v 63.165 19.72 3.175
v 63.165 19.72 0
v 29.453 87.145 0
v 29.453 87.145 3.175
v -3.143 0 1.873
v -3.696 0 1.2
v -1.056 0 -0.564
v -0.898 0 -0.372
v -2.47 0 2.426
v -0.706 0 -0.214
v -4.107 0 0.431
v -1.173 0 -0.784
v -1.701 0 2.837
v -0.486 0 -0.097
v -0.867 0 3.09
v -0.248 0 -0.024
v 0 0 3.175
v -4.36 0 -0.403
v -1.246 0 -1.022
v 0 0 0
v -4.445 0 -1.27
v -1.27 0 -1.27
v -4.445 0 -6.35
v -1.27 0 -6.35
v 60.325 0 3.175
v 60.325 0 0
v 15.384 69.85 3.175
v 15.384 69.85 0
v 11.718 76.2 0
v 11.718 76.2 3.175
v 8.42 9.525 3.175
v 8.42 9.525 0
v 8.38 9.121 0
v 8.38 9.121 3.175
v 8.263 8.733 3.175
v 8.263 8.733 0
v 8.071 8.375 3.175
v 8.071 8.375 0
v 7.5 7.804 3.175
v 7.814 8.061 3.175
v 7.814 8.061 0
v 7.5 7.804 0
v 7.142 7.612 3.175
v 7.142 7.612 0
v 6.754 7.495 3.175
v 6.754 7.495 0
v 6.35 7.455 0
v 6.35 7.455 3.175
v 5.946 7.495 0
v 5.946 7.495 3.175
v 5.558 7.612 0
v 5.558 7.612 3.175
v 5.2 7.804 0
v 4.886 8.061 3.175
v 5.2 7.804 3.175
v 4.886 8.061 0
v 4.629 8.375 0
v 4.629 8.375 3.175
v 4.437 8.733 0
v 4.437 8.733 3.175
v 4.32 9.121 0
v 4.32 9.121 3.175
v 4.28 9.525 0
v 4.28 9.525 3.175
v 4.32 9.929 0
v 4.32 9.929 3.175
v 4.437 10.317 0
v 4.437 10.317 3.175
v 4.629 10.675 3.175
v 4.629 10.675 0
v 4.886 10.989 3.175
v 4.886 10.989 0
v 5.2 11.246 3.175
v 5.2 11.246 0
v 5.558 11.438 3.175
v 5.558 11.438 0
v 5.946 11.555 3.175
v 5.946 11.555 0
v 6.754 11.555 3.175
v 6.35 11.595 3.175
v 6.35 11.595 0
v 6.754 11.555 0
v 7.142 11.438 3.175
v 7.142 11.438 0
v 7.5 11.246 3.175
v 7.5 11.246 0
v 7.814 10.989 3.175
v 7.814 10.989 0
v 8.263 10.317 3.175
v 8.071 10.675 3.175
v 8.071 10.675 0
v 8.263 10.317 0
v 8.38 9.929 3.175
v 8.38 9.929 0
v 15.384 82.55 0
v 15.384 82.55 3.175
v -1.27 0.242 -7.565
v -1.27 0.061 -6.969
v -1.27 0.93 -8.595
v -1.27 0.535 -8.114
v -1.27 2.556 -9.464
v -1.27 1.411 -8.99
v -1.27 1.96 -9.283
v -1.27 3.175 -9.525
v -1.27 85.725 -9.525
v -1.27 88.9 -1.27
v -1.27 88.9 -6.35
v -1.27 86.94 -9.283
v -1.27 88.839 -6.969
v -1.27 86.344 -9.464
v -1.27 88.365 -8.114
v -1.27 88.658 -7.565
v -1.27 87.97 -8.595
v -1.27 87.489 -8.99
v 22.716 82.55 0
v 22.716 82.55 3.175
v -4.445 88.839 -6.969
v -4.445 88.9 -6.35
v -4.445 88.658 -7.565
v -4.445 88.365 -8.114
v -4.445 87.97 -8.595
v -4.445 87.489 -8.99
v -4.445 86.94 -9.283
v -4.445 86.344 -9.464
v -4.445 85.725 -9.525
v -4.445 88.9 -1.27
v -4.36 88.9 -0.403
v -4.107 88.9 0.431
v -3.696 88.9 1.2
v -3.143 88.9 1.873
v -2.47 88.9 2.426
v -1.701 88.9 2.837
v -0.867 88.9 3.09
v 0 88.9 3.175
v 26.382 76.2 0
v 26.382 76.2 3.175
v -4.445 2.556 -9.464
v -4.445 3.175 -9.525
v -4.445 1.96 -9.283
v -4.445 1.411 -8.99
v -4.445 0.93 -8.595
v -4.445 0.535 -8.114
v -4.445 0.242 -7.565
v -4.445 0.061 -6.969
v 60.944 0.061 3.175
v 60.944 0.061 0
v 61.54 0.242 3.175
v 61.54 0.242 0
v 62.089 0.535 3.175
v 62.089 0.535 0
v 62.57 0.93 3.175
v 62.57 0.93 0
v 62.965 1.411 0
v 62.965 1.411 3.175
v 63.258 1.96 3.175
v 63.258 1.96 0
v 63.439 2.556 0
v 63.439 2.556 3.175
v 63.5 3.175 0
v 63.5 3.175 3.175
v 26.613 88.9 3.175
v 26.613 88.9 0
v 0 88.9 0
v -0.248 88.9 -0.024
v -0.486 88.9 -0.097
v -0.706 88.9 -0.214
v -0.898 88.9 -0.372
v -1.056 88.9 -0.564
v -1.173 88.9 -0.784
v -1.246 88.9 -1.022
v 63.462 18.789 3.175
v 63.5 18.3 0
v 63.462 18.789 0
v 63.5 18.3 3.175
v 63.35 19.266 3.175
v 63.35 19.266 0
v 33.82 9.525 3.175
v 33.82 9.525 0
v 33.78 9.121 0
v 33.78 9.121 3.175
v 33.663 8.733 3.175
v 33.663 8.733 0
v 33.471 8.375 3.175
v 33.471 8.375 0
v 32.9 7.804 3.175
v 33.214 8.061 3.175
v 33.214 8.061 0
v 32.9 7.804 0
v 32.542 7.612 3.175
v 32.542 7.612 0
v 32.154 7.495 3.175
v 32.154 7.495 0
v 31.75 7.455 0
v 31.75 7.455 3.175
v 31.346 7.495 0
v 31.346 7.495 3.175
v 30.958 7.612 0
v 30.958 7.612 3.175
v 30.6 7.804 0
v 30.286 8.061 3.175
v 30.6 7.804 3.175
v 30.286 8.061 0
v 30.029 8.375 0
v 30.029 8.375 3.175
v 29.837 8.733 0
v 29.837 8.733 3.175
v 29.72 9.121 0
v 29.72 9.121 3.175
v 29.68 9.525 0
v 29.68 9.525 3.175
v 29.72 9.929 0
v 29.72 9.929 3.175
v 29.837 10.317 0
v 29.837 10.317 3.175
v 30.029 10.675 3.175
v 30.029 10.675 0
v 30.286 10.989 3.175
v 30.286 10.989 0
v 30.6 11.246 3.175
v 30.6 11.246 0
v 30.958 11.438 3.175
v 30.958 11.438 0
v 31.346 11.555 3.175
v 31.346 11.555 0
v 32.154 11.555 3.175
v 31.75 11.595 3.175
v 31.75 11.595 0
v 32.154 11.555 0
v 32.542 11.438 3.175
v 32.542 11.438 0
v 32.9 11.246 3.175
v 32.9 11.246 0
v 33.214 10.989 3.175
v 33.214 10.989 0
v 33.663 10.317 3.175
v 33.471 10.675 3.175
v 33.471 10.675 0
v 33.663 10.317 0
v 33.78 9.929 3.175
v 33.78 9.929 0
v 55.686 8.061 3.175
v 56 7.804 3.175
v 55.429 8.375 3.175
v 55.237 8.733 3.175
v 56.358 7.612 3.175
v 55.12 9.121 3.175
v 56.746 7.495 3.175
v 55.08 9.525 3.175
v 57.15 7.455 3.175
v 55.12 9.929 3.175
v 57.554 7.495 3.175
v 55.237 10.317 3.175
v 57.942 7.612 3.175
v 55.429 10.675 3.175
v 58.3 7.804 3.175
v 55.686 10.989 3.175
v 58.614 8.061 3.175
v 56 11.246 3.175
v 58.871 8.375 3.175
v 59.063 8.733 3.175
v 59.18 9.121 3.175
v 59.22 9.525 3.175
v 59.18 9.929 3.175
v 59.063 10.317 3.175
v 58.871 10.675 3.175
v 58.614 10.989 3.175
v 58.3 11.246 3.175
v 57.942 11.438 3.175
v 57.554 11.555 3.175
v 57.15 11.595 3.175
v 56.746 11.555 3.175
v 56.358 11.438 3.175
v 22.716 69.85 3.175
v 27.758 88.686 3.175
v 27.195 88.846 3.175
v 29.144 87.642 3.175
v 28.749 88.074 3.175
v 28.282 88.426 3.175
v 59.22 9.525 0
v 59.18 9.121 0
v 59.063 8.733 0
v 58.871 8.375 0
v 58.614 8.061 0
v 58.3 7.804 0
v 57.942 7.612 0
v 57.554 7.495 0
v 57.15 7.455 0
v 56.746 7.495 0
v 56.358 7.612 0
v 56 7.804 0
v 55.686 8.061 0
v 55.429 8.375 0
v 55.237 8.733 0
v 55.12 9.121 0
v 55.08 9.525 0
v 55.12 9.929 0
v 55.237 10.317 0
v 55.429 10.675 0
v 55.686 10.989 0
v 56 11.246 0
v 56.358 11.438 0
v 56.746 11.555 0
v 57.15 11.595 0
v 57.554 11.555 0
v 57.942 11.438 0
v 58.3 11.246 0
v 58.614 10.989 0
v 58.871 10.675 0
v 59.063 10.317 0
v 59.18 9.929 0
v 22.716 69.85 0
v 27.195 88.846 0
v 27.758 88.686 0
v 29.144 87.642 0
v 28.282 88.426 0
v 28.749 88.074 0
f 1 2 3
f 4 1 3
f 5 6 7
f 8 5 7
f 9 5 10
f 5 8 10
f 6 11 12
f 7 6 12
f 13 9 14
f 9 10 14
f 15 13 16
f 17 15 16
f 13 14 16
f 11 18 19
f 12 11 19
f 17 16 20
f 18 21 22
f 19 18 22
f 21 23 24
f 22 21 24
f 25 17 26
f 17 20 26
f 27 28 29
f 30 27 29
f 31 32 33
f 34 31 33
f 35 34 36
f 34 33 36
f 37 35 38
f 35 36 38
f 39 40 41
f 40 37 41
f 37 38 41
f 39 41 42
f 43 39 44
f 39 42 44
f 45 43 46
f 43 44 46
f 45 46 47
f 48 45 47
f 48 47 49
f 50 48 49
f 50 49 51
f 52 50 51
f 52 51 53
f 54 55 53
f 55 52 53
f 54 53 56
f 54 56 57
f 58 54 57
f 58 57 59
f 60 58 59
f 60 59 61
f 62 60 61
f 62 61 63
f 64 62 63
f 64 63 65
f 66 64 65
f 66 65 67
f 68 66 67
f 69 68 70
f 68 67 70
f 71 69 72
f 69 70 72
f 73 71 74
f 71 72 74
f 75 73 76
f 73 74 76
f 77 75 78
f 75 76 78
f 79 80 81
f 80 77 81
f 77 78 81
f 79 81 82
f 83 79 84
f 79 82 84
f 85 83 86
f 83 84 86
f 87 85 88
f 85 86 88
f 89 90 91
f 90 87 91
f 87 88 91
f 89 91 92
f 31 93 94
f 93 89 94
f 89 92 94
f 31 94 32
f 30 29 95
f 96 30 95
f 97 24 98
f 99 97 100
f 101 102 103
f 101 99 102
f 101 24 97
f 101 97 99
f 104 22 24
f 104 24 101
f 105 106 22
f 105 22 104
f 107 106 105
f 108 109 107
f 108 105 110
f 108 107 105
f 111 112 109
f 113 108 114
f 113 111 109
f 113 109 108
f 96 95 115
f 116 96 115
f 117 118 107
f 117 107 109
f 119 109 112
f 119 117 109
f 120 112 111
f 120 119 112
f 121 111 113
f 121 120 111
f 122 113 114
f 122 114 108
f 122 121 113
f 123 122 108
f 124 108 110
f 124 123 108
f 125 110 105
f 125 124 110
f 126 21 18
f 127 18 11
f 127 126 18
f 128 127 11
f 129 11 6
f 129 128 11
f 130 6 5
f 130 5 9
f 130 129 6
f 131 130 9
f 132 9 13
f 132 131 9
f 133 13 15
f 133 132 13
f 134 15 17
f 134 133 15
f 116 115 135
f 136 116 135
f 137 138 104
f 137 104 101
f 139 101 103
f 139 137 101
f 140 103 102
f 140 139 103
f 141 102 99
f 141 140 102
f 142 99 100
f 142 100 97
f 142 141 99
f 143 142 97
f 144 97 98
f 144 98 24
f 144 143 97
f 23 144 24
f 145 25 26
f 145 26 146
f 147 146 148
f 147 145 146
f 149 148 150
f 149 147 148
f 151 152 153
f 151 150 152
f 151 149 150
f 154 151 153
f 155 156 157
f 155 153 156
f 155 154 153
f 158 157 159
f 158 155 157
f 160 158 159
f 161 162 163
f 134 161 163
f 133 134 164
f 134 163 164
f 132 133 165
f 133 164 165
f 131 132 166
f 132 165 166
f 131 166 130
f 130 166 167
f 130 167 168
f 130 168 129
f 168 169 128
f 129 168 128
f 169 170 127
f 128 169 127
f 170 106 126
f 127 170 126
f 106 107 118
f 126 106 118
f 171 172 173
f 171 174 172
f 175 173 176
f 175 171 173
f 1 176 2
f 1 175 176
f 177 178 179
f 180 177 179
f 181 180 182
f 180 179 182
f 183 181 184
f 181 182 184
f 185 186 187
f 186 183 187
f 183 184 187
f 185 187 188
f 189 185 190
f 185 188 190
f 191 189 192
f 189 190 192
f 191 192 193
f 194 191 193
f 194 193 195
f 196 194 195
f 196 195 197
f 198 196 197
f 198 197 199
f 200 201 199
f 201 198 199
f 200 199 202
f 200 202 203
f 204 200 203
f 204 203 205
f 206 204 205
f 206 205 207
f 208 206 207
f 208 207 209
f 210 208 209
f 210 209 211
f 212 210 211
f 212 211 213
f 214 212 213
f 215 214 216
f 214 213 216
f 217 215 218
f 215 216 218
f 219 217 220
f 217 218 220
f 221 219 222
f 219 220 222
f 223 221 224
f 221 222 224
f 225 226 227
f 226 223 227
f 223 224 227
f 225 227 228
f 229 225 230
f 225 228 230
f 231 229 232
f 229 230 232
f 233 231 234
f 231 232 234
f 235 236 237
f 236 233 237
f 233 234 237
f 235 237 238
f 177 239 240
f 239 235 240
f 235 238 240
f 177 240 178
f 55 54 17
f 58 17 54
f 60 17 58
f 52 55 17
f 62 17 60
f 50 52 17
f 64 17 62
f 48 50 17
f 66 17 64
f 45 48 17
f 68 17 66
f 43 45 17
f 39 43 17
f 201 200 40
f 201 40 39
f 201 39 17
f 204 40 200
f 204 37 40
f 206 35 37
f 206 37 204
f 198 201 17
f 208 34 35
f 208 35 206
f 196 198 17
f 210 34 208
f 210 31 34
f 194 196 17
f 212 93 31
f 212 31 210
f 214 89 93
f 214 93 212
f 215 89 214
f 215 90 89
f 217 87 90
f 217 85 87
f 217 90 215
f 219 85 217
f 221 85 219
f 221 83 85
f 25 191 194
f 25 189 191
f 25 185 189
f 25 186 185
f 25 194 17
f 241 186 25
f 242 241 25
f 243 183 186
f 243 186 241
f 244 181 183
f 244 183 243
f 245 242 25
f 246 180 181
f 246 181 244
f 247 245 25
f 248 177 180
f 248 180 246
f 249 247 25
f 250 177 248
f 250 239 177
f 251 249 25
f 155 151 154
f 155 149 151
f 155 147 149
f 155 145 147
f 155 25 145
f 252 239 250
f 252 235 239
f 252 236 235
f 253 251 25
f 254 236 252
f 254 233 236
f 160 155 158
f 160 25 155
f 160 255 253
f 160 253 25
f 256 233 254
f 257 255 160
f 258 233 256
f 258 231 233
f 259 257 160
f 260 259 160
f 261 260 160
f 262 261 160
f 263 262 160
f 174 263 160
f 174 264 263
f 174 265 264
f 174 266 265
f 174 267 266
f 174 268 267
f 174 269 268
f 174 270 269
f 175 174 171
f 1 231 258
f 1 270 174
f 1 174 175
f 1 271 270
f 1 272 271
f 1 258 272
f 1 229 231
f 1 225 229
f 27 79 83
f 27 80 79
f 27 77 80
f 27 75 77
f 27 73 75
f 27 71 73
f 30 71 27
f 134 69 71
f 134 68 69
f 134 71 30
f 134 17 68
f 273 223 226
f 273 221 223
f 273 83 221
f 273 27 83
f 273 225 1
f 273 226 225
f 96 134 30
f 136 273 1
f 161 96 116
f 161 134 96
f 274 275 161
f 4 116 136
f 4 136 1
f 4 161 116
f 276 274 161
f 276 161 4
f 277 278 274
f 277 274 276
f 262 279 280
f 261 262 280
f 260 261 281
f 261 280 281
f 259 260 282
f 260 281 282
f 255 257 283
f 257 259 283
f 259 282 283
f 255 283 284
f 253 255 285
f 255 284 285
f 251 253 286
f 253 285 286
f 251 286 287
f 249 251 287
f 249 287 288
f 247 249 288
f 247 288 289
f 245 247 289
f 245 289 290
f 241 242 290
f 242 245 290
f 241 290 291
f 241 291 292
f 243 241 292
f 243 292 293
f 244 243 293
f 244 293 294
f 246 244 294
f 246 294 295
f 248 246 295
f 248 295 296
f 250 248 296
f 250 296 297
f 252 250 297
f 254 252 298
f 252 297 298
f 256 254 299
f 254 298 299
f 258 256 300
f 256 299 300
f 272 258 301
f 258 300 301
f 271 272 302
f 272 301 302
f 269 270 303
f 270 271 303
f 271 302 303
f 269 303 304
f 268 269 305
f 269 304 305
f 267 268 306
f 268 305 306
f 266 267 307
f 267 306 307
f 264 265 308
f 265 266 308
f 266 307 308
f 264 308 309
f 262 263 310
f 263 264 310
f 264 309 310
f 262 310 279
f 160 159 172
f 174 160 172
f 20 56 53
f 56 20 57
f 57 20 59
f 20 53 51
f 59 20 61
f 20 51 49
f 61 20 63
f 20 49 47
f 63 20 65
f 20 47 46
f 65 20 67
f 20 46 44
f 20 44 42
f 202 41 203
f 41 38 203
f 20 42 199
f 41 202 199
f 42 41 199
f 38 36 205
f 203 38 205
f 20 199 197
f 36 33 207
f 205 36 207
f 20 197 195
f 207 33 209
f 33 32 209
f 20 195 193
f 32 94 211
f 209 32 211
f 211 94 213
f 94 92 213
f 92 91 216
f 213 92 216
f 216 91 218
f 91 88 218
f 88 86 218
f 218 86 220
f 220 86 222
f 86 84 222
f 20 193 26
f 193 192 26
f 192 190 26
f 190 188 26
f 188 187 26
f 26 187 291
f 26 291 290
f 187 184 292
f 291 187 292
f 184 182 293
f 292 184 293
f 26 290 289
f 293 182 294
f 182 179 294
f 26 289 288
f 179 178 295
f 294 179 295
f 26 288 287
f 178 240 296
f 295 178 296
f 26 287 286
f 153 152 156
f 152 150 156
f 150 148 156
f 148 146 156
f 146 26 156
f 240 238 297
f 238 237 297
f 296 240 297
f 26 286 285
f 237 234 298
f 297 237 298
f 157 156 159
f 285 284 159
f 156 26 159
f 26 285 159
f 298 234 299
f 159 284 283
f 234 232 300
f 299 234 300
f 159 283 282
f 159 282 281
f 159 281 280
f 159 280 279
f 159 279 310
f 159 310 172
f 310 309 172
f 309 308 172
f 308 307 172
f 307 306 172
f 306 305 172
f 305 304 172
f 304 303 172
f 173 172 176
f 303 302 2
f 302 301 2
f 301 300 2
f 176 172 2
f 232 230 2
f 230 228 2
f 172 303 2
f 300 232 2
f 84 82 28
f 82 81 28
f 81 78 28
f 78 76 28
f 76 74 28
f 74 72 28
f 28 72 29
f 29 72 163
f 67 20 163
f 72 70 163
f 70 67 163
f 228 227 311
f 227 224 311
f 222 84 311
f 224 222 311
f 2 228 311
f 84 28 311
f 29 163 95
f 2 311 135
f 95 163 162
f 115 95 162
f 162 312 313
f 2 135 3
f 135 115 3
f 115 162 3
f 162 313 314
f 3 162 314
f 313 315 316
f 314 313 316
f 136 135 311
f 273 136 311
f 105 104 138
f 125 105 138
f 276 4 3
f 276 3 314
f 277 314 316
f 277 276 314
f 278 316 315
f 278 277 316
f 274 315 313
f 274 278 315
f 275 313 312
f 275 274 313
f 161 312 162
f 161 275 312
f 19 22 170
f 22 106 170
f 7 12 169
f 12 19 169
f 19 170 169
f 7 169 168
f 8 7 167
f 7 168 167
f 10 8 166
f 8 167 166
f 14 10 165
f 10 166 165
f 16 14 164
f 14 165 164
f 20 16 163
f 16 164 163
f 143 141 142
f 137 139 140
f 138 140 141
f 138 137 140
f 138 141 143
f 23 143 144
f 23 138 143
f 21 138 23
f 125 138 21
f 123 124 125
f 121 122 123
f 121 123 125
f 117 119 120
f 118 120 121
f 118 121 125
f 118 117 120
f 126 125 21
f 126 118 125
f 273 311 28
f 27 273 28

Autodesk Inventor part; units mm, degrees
ref_plane "YZ Plane" through (0, 0, 0) normal (1, 0, 0) x (0, 1, 0)
ref_plane "XZ Plane" through (0, 0, 0) normal (0, 1, 0) x (-1, 0, 0)
ref_plane "XY Plane" through (0, 0, 0) normal (0, 0, 1) x (1, 0, 0)
sketch "Sketch1" plane through (0, 0, 0) normal (0, 0, 1) x (1, 0, 0)
  line L0 (0, 0) -> (63.5, 0)
  line L1 (63.5, 0) -> (63.5, 19.05)
  line L2 (0, 88.9) -> (0, 0)
  circle A0 centre (6.35, 9.525) radius 2.0701
  circle A1 centre (31.75, 9.525) radius 2.0701
  circle A2 centre (57.15, 9.525) radius 2.0701
  line L3 (63.5, 19.05) -> (28.575, 88.9)
  line L4 (28.575, 88.9) -> (0, 88.9)
  line L5 (22.7162, 82.55) -> (26.3823, 76.2)
  line L6 (26.3823, 76.2) -> (22.7162, 69.85)
  line L7 (22.7162, 69.85) -> (15.3838, 69.85)
  line L8 (15.3838, 69.85) -> (11.7177, 76.2)
  line L9 (11.7177, 76.2) -> (15.3838, 82.55)
  line L10 (15.3838, 82.55) -> (22.7162, 82.55)
  point P0 (19.05, 76.2)
  dimension "d5" = 63.5
  dimension "d6" = 4.1402
  dimension "d7" = 6.35
  dimension "d8" = 9.525
  dimension "d24" = 25.4
  dimension "d29" = 88.9
  dimension "d30" = 19.05
  dimension "d31" = 28.575
  dimension "d32" = 12.7
  dimension "d34" = 19.05
  dimension "d35" = 12.7
extrude "Plate1" add sketch "Sketch1" along normal blind 3.175
sketch "Sketch3" plane through (-1.27, 88.9, -1.27) normal (-1, 0, 0) x (0, -1, 0)
  line L0 (88.9, 0) -> (0, 0)
  line L1 (0, 0) -> (0, -8.255)
  line L2 (0, -8.255) -> (88.9, -8.255)
  line L3 (88.9, -8.255) -> (88.9, 0)
edge flange "Flange2" height 12.7 angle 90 thickness 3.175 bend radius 1.27 thickness toward (-1, 0, 0) relief tear relief width 3.175 relief depth 1.5875 edges at (0, 44.45, 0) wall of the first edge with corners at (-1.27, 0, -1.27) (-1.27, 88.9, -1.27) (-1.27, 88.9, -9.525) (-1.27, 0, -9.525)
bend "Bend2"
corner "Corner2"
fillet "Fillet1" radius 3.175 5 edges at (28.575, 88.9, 1.5875) (-2.8575, 0, -9.525) (63.5, 19.05, 1.5875) (63.5, 0, 1.5875) (-2.8575, 88.9, -9.525)
equation "\"d36\" = BendReliefWidth"
equation "\"d37\" = BendReliefDepth"
equation "\"d38\" = MinimumRemnant"
equation "\"d39\" = BendRadius"
equation "\"d43\" = CornerReliefSize"
equation "\"d44\" = GapSize"
equation "\"d45\" = JacobiRadiusSize"
equation "\"BendRadius\" = Thickness"
equation "\"BendReliefWidth\" = Thickness"
equation "\"BendReliefDepth\" = 0.5 * Thickness"
equation "\"CornerReliefSize\" = 4 * Thickness"
equation "\"MinimumRemnant\" = 2 * Thickness"
equation "\"TransitionRadius\" = BendRadius"
equation "\"JacobiRadiusSize\" = BendRadius"
equation "\"GapSize\" = Thickness"
equation "\"d11\" = BendRadius"
equation "\"Thickness\" = 3.175"
properties part number "Spacer 3 (L-L) ipt" material "Aluminum 6061"
